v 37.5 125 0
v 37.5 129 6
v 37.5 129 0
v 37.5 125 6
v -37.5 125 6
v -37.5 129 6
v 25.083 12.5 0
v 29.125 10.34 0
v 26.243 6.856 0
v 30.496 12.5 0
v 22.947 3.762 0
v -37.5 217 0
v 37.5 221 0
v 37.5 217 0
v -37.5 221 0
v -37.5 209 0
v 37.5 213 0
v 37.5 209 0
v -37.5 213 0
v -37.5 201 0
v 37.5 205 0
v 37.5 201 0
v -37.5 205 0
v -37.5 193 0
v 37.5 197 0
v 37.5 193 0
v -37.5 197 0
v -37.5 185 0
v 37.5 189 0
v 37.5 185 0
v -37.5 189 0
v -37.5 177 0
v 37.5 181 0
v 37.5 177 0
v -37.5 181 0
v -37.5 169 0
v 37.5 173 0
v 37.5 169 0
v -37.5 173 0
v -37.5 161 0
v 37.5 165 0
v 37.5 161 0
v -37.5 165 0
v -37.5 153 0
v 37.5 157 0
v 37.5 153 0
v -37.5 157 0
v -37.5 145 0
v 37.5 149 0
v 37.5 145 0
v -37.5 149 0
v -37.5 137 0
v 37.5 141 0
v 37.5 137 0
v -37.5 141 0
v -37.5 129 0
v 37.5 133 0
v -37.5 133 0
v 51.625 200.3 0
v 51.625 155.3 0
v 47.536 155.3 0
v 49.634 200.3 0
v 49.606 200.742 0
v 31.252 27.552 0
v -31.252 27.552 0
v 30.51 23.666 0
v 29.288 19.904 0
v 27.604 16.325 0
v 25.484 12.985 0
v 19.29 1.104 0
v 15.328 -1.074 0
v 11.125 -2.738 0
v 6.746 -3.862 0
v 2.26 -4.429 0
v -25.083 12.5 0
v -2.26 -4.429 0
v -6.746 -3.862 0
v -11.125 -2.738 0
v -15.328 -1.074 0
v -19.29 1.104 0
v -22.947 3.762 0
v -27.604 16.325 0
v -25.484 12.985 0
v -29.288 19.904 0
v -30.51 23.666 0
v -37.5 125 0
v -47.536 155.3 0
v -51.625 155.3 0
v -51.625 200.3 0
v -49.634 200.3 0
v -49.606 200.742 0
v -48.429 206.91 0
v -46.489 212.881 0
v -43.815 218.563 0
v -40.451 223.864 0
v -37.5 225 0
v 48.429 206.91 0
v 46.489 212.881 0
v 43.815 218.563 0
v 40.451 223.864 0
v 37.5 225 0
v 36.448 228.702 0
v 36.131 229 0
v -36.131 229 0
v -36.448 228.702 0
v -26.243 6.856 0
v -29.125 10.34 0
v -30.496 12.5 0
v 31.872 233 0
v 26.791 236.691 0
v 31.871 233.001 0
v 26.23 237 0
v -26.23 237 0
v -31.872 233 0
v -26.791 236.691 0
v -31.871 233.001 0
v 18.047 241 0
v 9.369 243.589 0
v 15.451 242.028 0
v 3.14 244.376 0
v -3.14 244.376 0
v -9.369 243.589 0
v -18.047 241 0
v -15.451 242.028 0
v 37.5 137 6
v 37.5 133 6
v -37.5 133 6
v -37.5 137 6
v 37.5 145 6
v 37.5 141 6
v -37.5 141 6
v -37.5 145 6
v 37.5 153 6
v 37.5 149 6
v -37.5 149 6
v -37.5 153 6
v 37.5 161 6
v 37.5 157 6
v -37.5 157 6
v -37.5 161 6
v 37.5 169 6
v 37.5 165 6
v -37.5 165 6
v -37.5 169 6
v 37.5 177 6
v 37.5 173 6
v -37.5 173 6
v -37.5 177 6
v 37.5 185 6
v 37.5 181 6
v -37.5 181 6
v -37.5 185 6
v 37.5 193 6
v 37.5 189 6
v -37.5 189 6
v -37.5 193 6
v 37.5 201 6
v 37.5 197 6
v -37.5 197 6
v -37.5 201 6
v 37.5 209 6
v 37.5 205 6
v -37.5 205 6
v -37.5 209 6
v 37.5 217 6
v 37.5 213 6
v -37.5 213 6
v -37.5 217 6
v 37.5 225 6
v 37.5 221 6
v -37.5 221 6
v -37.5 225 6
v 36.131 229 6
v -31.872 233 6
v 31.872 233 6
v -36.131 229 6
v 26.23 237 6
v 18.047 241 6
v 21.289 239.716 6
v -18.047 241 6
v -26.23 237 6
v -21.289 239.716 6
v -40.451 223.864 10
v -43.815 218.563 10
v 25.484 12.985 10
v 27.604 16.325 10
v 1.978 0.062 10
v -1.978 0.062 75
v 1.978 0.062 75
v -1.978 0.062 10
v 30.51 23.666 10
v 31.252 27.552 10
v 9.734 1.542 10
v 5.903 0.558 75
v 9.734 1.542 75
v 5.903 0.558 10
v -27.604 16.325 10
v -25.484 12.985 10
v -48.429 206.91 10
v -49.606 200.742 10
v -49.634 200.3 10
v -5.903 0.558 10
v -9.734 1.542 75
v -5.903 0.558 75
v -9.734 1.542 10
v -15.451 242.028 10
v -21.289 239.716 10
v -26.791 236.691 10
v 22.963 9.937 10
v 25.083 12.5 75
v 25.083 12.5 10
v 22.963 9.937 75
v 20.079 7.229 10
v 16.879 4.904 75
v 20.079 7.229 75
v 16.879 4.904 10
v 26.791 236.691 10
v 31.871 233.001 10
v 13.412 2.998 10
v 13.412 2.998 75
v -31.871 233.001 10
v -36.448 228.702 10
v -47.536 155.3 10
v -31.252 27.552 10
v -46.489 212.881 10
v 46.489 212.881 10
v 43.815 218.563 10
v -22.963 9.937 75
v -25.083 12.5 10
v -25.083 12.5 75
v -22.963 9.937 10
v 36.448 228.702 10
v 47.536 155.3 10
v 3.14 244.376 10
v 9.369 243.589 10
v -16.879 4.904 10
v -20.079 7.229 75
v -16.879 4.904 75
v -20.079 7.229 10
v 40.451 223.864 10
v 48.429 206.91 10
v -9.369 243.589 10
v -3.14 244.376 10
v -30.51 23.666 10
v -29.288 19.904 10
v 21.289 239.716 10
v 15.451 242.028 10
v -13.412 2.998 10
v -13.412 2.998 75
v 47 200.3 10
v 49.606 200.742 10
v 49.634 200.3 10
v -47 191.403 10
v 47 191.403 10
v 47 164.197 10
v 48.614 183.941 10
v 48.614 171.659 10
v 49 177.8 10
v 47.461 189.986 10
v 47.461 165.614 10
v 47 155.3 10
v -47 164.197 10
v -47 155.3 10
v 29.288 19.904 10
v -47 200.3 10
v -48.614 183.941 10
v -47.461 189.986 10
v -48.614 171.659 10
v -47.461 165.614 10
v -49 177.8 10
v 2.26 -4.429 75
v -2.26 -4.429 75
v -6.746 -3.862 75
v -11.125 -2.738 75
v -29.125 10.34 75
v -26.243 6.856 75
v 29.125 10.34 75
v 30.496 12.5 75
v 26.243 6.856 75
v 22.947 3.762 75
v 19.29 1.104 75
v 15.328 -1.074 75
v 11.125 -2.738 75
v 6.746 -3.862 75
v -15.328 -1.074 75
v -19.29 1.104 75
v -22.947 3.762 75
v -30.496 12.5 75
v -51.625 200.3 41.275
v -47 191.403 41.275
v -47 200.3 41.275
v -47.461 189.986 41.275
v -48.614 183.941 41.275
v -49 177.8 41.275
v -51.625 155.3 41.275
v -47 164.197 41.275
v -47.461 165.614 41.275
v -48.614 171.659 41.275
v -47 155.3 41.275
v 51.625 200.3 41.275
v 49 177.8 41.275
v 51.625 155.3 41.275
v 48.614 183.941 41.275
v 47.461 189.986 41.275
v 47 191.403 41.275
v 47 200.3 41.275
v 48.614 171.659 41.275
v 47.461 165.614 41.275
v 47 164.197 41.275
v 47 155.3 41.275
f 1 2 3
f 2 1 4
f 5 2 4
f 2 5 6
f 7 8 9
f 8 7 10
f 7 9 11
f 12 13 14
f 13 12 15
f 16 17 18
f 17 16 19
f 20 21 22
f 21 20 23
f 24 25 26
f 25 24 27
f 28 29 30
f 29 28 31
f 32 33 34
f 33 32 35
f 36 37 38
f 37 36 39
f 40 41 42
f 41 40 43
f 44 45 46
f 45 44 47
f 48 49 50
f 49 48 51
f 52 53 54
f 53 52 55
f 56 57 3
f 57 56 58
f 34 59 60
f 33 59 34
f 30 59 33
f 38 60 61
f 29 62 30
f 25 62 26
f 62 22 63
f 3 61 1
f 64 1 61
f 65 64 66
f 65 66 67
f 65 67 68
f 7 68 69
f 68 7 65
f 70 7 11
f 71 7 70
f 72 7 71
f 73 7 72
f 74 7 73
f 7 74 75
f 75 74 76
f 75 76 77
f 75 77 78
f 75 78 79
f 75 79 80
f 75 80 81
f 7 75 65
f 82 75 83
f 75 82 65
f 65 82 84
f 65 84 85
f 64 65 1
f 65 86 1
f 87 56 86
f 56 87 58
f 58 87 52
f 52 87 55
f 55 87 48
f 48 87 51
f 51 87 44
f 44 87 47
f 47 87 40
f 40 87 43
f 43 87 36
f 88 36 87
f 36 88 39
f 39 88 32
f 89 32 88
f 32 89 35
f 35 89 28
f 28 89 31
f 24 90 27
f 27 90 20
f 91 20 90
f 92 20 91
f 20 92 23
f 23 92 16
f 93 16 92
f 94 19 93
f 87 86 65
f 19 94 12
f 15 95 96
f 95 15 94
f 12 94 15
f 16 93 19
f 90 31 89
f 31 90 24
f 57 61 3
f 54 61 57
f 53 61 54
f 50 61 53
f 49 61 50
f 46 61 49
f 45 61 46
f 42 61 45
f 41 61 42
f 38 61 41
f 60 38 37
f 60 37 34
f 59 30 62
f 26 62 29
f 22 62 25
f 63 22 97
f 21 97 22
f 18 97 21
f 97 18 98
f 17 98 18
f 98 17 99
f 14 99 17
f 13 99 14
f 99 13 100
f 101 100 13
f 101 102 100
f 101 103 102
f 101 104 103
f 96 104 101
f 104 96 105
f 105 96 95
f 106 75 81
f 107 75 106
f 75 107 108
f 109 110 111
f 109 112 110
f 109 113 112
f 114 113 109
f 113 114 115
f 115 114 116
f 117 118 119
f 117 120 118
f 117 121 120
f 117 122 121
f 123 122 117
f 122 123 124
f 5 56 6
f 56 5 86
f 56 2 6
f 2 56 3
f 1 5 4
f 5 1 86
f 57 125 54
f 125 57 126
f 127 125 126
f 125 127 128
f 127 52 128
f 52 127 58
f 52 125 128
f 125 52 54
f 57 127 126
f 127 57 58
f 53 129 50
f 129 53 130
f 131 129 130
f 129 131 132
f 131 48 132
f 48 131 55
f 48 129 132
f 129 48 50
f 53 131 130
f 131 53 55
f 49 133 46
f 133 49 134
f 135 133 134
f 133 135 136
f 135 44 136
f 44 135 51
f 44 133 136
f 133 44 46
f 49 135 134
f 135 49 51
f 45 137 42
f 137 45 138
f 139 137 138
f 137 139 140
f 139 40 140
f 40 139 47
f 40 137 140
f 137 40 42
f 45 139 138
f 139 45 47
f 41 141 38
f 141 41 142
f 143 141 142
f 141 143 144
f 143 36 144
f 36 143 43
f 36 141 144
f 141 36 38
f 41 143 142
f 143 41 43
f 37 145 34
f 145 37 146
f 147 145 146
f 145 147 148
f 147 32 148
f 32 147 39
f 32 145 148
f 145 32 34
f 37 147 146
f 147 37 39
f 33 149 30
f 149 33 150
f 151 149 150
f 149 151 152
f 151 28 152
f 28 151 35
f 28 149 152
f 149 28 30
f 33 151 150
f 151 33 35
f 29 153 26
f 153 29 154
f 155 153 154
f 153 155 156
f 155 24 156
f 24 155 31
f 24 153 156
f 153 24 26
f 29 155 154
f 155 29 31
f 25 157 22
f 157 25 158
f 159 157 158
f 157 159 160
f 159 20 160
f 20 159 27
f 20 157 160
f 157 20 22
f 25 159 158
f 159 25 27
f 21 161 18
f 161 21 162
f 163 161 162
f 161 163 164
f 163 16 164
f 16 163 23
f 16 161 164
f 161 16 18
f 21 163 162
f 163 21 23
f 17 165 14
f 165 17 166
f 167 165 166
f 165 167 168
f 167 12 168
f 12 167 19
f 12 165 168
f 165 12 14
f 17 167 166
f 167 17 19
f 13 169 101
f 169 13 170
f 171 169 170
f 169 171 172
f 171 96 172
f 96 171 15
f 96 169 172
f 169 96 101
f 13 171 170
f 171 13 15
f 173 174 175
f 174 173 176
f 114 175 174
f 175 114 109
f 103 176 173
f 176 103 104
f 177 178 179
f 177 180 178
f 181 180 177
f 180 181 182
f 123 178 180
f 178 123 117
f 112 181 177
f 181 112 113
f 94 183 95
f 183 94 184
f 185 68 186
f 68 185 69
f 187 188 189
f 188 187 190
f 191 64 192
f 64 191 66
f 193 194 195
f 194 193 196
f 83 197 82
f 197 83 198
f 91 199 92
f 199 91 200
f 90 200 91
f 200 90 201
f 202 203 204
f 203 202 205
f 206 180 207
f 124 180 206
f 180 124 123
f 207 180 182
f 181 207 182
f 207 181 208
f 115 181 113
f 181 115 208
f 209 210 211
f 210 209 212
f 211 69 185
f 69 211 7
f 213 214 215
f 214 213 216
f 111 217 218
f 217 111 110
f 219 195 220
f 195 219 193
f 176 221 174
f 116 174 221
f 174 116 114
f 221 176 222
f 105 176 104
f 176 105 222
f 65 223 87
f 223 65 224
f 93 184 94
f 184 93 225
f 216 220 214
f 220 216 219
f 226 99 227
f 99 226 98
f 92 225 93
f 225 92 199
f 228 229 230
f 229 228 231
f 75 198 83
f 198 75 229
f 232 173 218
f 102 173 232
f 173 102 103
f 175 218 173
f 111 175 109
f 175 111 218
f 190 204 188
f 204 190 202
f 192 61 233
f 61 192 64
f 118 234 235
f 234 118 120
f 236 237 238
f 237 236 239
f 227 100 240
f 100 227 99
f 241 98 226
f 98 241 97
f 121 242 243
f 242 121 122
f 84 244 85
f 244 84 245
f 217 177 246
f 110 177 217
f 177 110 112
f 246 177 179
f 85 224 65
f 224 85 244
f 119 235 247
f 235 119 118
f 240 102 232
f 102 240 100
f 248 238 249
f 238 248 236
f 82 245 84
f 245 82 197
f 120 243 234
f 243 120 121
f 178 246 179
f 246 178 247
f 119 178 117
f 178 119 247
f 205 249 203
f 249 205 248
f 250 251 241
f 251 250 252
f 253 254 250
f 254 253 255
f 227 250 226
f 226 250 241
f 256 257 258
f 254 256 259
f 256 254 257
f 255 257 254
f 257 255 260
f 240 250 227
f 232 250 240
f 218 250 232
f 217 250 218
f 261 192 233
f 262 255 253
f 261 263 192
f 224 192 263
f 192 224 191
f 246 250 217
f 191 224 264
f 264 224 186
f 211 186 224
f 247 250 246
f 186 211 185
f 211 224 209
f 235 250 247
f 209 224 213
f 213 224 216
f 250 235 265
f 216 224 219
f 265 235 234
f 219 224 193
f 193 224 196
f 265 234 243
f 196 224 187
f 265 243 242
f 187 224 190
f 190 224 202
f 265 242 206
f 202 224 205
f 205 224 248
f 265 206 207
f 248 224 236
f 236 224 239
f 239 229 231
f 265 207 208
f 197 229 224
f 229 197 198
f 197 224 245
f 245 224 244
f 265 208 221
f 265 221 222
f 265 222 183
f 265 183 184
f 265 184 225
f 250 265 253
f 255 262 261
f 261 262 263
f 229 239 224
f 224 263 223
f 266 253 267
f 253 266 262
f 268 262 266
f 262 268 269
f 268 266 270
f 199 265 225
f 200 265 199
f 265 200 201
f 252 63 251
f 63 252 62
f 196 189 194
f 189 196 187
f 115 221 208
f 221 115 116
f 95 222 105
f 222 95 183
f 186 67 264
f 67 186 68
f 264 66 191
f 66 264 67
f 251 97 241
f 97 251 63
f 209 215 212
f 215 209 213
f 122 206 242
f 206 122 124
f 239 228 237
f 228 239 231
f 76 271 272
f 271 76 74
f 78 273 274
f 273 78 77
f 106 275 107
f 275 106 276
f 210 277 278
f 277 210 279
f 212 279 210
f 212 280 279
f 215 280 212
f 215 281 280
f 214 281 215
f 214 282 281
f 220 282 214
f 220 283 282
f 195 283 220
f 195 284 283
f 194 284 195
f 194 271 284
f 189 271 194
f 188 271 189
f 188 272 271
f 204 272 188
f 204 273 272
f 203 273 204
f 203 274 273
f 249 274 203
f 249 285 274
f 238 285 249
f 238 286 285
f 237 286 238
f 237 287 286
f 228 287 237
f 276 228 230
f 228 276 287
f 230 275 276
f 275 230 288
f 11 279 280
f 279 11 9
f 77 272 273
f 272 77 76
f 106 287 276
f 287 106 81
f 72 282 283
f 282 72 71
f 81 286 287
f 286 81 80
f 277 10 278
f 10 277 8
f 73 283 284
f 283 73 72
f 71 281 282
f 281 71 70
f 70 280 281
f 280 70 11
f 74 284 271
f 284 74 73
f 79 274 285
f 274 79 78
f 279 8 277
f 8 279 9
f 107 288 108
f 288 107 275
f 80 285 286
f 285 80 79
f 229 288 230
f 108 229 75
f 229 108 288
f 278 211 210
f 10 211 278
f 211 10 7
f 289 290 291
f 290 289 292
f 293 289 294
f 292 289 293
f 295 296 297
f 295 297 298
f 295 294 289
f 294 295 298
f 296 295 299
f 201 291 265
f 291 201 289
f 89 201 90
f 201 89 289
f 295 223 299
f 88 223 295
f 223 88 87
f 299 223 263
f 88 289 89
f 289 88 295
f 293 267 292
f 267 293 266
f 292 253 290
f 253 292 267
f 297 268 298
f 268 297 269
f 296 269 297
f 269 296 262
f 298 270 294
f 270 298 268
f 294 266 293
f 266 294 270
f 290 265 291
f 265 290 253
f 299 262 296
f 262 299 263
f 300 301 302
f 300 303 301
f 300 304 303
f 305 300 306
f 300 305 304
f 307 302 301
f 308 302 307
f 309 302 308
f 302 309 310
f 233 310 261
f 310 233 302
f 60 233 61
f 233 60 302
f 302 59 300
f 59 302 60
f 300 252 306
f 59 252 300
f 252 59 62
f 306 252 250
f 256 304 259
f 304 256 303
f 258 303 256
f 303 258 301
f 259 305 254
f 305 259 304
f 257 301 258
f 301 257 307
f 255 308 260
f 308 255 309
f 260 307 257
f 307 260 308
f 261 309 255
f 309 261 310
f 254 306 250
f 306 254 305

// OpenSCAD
// Steve Helminen
// MY4777 - Michigan Technological University
// Source: https://www.appropedia.org/File:Shoe_ver_2_Scad.scad (CC-BY-SA-3.0)
// All dimensions are in mm
// Distances from center to cross section
a = 34.925;
b = a + 38.1;
c = b + 53.975;
d = c + 50.8;
e = 244.475;
step = 0;


$fn=50;

union() {
//Forming the sole of the shoe:
	difference (){
		linear_extrude(height = 10) {
			hull() {

			// Back of the foot (heal)
			translate([0,31.5,0])
			circle(d= 63,center = true);

			//Cross Section #1 of foot (heel)
			translate([0,a,0])
			circle(d = 63.5, center = true);

			//Cross Section #2 of foot (shortest distance of arch)
			translate([0,b,0])
			circle(d= 57.15,center = true);

			//Cross Section #3 of foot (Widening section between shortest distance and the balls of your feet
			translate([0,c,0])
			circle(d= 76.2,center = true);

			translate([0,d,0])
			circle(d= 100,center = true);

			translate([0,e-50,0])
			circle(d= 100,center = true);

			}
		
		}

			//Cutting sections in the bottom of the shoe for flexibility
			for(i=[0:20]) {
			translate([0, c+(i*8), 3])
			cube(size = [75,4,6], center = true);
			}
	}


//Ankle Support
	difference() {
	translate ([0,31.5,37.5])
	cylinder(h = 75, d1 = 72, d2 = 72, center = true);

		//Section Cuts out of ankle main
		translate ([0,31.5,37.5])
		cylinder(h = 75, d1 = 63 , d2 = 63, center = true);

		translate ([0,50,50])
		cube(size = [150,75,100], center = true);
	



		}

}

// Strap attachment point
// Side supports
difference() {			
				rotate([0,0,90]){
				translate ([d,(95.25/2),41.275/2])
				cube(size = [45,8,41.275], center = true);
				}
			
				//Cut out of foot geometry
				translate([0,d,35])
				cylinder(h = 50, d= 98,center = true);

				translate([-7,d,48])
				cube(size = [80,80,80],center = true);
				
}
difference() {
				rotate([0,0,90]){
				translate ([d,(-95.25/2),41.275/2])
				cube(size = [45,8,41.275], center = true);
				}
			
				//Cut out of foot geometry
				translate([0,d,35])
				cylinder(h = 50, d= 98,center = true);

				translate([7,d,48])
				cube(size = [80,80,80],center = true);
}
